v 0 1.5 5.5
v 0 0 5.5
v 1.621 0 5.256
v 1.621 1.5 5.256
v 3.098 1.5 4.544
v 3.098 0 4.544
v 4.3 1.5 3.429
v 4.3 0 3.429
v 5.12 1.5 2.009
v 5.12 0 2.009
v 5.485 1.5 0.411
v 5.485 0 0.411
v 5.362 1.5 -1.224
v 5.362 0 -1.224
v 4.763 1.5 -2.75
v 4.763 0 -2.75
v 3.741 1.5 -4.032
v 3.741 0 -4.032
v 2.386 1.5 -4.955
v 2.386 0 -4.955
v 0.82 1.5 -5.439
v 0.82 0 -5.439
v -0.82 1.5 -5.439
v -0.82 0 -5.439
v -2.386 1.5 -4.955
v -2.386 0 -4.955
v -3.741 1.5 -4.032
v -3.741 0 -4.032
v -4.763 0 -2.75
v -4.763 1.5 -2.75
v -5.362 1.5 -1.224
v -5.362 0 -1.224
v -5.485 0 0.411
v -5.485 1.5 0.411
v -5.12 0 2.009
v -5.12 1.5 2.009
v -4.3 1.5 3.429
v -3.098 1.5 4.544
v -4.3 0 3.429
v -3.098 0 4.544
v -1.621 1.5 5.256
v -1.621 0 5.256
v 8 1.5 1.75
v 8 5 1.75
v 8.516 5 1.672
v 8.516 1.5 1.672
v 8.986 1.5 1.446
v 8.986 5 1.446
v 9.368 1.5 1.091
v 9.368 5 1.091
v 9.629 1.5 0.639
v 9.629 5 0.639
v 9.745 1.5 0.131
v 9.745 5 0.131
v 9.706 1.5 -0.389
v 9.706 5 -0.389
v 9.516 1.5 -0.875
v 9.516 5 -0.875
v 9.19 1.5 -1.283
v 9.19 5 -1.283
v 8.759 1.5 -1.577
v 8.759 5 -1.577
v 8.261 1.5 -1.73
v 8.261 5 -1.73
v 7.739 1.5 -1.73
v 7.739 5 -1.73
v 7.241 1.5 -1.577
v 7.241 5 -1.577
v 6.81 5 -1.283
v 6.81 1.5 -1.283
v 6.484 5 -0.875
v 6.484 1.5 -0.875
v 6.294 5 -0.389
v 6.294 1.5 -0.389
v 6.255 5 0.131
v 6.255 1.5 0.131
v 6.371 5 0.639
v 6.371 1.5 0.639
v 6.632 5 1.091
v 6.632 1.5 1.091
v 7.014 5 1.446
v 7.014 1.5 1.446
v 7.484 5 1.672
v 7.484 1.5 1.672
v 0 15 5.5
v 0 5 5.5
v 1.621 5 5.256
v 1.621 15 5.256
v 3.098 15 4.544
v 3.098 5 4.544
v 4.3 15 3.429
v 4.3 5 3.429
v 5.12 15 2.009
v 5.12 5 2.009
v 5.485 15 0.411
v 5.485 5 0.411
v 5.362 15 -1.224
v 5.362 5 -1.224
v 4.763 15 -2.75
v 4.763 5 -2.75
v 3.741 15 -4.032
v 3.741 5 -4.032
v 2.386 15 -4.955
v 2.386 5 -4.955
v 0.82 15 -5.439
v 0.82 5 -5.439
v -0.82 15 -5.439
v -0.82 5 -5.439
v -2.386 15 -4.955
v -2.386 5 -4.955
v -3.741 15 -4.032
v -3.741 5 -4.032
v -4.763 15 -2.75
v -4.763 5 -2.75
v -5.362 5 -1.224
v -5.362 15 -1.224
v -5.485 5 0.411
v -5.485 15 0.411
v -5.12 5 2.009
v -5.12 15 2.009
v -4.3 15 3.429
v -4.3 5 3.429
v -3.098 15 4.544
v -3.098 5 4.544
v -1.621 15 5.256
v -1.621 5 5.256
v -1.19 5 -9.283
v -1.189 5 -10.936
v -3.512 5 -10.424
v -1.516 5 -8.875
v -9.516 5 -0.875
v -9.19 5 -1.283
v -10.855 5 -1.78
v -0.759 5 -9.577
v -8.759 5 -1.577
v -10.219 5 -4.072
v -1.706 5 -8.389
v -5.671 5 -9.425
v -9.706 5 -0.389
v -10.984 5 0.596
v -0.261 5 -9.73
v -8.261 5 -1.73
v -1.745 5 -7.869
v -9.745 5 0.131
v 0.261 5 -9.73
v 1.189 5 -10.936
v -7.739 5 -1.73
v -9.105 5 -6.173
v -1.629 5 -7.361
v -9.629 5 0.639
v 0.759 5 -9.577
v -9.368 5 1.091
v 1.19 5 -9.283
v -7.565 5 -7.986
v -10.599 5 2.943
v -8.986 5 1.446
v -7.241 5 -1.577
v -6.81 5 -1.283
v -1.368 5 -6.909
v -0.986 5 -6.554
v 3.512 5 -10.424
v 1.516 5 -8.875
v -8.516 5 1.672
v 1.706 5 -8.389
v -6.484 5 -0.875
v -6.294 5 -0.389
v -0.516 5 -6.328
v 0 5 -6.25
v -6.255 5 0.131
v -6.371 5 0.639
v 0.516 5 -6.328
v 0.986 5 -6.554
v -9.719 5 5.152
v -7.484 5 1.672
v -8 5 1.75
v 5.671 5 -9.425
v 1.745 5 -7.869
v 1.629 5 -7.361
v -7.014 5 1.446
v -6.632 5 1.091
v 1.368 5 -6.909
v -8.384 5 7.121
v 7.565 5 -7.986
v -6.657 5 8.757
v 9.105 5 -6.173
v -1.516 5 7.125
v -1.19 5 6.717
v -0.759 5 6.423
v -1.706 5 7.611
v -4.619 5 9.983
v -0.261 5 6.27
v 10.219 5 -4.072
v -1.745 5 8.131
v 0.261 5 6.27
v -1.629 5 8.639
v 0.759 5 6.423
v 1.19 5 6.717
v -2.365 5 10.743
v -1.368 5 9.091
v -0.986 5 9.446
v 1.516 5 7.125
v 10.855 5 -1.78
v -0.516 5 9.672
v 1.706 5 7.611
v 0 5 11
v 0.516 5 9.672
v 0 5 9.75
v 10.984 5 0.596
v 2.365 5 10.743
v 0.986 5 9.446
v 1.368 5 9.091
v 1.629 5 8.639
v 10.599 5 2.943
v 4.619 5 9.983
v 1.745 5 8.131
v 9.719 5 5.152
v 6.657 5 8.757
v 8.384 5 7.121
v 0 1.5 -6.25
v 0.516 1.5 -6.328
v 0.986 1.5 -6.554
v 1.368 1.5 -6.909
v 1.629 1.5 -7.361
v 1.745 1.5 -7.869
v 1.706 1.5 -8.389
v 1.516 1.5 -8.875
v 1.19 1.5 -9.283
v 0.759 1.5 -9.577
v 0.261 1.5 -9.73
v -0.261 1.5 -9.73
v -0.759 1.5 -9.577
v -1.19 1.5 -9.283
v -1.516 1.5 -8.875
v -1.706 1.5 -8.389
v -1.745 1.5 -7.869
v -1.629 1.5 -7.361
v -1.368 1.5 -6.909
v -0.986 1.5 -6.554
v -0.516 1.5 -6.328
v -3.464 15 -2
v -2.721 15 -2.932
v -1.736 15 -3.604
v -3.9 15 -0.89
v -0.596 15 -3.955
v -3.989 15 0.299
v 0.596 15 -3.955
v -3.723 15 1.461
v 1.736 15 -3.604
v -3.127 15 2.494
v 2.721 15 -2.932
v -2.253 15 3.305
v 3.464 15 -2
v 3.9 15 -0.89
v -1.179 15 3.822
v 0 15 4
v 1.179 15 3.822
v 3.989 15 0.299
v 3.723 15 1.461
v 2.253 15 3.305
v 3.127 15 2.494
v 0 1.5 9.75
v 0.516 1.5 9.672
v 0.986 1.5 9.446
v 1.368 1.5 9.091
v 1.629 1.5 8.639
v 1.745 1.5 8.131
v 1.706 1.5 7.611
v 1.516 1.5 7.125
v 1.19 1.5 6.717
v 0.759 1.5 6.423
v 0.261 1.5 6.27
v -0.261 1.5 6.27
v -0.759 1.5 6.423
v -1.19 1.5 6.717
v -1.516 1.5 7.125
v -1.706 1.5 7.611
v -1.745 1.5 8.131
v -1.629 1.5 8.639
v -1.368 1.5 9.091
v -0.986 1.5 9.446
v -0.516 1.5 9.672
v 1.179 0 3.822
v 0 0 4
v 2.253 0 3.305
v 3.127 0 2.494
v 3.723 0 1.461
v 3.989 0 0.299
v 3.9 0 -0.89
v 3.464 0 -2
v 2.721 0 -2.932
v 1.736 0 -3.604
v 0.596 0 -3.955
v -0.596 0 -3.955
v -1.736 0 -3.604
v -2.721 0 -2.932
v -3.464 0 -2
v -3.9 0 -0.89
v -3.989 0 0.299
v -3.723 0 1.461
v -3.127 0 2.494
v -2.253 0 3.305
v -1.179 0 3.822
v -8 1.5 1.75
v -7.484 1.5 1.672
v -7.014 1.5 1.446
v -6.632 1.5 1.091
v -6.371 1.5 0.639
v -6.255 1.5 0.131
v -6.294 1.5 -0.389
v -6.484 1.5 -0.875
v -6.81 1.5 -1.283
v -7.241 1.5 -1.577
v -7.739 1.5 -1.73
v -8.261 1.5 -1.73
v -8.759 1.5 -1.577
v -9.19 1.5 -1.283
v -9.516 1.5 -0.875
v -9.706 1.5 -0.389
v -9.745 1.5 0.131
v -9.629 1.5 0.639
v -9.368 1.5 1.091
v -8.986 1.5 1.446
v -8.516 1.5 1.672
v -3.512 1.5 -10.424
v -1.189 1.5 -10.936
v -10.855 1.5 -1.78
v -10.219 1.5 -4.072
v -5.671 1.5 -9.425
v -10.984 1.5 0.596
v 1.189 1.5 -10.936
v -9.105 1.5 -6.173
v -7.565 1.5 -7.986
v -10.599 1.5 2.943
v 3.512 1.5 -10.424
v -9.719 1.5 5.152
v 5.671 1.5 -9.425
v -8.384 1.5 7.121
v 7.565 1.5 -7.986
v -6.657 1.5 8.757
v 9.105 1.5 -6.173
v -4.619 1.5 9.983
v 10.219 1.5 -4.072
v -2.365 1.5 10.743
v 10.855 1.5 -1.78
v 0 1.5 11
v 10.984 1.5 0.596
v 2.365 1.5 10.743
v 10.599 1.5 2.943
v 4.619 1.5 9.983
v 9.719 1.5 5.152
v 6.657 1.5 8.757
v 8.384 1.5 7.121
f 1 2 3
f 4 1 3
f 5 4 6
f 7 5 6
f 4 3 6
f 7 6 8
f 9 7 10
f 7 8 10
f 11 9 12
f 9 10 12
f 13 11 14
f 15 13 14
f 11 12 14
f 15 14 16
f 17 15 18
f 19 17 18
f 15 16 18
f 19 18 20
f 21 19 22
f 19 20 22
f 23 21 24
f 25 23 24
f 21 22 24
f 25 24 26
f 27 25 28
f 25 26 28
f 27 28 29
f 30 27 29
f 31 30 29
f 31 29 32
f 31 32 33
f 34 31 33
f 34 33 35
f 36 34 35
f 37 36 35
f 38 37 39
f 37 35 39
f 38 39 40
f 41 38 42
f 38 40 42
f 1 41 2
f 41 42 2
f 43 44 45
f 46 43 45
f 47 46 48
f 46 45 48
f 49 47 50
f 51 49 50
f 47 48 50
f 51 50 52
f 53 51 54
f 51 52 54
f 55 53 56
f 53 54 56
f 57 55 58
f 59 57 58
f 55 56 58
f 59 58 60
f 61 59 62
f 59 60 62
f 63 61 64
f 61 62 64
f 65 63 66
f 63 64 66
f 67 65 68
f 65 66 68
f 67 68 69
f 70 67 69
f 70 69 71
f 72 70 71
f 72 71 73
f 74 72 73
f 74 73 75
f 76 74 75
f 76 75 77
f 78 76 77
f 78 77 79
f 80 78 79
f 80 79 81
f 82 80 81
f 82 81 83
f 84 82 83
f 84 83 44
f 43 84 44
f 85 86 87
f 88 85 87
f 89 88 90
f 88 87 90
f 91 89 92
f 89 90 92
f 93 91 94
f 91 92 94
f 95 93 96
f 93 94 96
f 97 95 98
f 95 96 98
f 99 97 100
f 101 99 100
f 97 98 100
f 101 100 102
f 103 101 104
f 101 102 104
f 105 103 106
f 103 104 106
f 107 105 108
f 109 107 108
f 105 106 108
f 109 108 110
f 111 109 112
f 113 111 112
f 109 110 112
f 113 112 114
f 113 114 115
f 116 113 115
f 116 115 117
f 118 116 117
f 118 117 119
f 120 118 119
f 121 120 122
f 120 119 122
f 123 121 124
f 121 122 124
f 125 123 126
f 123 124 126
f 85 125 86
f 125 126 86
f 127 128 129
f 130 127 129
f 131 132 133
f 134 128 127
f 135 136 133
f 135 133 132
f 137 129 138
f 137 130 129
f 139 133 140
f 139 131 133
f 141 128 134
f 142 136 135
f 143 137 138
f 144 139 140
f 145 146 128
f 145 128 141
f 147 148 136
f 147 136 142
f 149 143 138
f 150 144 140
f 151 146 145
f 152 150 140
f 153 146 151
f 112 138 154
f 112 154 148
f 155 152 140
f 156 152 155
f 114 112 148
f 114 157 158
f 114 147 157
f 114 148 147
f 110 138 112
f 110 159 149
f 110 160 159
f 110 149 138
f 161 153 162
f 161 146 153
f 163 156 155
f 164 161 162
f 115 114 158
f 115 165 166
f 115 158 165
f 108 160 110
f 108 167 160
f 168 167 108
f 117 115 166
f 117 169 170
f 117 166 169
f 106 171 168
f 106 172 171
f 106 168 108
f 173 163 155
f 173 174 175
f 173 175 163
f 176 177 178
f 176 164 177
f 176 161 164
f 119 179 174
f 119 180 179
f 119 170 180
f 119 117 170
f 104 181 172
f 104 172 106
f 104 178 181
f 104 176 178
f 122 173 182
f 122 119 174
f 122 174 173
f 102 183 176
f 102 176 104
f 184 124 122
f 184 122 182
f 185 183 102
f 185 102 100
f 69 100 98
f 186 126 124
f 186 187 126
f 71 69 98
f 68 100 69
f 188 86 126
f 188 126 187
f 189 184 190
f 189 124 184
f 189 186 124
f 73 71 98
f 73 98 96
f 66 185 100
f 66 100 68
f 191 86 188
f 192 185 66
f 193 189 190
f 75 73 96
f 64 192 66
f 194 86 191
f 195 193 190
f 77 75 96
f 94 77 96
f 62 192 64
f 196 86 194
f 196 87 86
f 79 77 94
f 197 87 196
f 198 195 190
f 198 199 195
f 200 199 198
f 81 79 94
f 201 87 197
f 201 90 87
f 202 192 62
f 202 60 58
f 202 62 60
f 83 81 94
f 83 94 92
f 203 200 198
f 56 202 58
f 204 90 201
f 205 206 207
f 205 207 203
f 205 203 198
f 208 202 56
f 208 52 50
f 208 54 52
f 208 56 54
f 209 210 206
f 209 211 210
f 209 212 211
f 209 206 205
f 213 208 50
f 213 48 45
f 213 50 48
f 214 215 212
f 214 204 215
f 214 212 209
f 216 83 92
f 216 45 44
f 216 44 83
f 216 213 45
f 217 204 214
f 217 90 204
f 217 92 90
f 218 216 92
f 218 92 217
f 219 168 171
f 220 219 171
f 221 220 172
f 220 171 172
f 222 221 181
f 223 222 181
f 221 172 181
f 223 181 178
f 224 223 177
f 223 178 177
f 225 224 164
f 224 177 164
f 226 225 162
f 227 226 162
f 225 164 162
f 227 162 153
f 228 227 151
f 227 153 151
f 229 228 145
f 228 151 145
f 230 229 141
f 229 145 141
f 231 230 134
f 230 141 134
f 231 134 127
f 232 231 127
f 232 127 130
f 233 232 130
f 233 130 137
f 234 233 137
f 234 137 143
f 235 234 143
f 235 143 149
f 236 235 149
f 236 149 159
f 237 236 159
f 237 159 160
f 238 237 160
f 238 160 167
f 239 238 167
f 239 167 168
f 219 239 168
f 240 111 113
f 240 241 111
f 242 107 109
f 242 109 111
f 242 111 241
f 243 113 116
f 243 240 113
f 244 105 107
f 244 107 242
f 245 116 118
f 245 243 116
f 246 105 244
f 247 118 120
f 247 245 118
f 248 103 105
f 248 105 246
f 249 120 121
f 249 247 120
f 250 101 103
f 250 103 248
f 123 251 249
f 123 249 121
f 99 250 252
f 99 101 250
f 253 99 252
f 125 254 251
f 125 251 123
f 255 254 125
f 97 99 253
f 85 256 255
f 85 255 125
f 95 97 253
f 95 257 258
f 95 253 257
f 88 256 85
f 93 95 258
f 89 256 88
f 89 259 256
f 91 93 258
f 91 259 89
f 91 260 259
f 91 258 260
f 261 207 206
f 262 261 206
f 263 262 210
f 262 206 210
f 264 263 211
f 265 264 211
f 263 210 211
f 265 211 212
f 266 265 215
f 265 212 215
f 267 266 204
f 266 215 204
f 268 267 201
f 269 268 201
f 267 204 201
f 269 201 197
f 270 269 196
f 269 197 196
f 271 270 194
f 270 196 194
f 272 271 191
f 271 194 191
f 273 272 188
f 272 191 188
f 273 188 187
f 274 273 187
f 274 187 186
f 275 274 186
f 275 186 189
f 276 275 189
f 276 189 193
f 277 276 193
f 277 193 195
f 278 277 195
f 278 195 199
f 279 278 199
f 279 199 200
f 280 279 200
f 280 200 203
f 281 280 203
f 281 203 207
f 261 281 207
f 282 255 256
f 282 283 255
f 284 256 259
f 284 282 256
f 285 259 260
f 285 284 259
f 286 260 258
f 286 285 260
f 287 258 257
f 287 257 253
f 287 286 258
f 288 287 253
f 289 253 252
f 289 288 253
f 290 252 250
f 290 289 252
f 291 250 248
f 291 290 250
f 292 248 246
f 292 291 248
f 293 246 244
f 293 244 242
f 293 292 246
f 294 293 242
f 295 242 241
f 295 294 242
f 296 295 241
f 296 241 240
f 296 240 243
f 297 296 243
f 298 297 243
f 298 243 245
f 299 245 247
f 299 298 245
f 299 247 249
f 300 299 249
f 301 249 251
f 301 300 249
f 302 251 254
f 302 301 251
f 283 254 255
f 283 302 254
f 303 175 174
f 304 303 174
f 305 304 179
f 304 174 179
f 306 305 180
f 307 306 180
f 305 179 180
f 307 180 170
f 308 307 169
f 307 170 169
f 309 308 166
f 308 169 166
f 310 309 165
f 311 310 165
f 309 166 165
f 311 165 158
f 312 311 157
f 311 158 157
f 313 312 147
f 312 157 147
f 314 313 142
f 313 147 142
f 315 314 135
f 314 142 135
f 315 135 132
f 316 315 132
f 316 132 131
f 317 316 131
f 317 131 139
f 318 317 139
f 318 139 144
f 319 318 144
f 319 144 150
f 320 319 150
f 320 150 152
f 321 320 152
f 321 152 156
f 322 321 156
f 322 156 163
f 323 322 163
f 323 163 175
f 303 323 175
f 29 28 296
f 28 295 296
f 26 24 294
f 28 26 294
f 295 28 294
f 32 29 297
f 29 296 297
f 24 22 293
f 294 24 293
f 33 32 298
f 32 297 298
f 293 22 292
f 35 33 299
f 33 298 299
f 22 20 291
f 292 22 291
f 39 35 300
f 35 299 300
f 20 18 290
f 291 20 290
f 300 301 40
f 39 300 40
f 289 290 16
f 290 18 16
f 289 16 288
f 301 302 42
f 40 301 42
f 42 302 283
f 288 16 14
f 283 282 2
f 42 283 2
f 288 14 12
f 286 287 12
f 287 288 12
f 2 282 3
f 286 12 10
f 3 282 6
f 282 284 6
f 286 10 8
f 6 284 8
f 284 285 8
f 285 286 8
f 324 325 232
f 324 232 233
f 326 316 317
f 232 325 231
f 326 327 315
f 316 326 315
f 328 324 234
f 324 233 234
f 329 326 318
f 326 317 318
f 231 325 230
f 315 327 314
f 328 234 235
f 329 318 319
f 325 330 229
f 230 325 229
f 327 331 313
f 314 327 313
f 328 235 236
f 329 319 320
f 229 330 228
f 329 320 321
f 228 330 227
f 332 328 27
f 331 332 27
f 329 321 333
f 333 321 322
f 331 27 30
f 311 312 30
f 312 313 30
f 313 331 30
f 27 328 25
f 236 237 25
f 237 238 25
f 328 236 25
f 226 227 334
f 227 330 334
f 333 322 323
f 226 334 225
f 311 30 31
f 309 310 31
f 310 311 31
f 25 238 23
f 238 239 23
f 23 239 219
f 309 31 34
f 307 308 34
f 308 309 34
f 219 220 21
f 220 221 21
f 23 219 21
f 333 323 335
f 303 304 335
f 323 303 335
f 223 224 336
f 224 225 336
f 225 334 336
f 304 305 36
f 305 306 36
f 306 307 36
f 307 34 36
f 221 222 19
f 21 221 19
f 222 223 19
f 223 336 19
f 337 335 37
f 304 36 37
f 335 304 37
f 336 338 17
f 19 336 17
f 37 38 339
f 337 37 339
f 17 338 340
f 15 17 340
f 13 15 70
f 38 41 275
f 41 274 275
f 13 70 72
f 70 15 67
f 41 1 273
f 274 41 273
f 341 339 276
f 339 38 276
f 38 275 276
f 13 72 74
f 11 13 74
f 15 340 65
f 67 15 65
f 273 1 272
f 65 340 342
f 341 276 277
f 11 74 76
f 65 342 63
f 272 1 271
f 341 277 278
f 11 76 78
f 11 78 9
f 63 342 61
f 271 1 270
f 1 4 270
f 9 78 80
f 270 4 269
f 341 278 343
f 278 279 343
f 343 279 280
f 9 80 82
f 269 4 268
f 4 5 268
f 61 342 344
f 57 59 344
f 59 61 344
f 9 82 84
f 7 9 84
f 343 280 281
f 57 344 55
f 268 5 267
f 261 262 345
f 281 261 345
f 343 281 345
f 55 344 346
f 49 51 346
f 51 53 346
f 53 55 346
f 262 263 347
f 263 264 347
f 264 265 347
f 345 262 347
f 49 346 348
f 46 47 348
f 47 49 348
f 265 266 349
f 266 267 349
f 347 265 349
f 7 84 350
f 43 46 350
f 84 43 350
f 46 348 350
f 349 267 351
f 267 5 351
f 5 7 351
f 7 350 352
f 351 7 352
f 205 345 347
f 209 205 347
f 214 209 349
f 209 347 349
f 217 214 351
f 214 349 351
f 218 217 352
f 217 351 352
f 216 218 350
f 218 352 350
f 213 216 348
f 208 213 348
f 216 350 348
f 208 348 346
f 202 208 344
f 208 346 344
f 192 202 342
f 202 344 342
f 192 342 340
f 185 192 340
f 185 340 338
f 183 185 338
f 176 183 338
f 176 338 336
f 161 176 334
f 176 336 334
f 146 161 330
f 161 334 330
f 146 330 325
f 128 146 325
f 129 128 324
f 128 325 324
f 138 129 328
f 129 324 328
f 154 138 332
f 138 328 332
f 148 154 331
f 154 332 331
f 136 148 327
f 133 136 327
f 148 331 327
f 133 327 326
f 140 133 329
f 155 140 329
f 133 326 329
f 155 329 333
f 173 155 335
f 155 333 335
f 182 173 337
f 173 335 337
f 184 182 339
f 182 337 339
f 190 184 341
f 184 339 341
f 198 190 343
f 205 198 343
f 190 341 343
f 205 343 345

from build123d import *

# Parameters (mm, degrees)
SKETCH_1_R          = 5.5
SKETCH_1_R_2        = 4
EXTRUDE_1_DEPTH     = 1.5
SKETCH_2_R          = 11
SKETCH_2_R_2        = 4
EXTRUDE_2_DEPTH     = 3.5
SKETCH_3_R          = 5.5
SKETCH_3_R_2        = 4
EXTRUDE_3_DEPTH     = 10
SKETCH_4_R          = 1.75
CUT_EXTRUDE_1_DEPTH = 19.493242009


with BuildPart() as part:
    # 草图1 → 凸台-拉伸1 (new body)
    with BuildSketch(Plane(origin=(0, 0, 0), x_dir=(1, 0, 0), z_dir=(0, 1, 0))):
        with Locations(Location((0, 0, 0), (0, 0, 270))):
            Circle(SKETCH_1_R)
        with Locations(Location((0, 0, 0), (0, 0, 270))):
            Circle(SKETCH_1_R_2, mode=Mode.SUBTRACT)
    extrude(amount=EXTRUDE_1_DEPTH)

    # 草图2 → 凸台-拉伸2 (add)
    with BuildSketch(Plane(origin=(0, 1.5, 0), x_dir=(1, 0, 0), z_dir=(0, 1, 0))):
        with Locations(Location((0, 0, 0), (0, 0, 270))):
            Circle(SKETCH_2_R)
        with Locations(Location((0, 0, 0), (0, 0, 270))):
            Circle(SKETCH_2_R_2, mode=Mode.SUBTRACT)
    extrude(amount=EXTRUDE_2_DEPTH)

    # 草图3 → 凸台-拉伸3 (add)
    with BuildSketch(Plane(origin=(0, 5, 0), x_dir=(1, 0, 0), z_dir=(0, 1, 0))):
        with Locations(Location((0, 0, 0), (0, 0, 270))):
            Circle(SKETCH_3_R)
        with Locations(Location((0, 0, 0), (0, 0, 270))):
            Circle(SKETCH_3_R_2, mode=Mode.SUBTRACT)
    extrude(amount=EXTRUDE_3_DEPTH)

    # 草图4 → 切除-拉伸1 (cut, through all)
    with BuildSketch(Plane(origin=(0, 5, 0), x_dir=(1, 0, 0), z_dir=(0, 1, 0))):
        with Locations(Location((0, 8, 0), (0, 0, 270))):
            Circle(SKETCH_4_R)
        with Locations(Location((8, 0, 0), (0, 0, 270))):
            Circle(SKETCH_4_R)
        with Locations(Location((0, -8, 0), (0, 0, 270))):
            Circle(SKETCH_4_R)
        with Locations(Location((-8, 0, 0), (0, 0, 270))):
            Circle(SKETCH_4_R)
    extrude(amount=-CUT_EXTRUDE_1_DEPTH, mode=Mode.SUBTRACT)


solid = part.part
